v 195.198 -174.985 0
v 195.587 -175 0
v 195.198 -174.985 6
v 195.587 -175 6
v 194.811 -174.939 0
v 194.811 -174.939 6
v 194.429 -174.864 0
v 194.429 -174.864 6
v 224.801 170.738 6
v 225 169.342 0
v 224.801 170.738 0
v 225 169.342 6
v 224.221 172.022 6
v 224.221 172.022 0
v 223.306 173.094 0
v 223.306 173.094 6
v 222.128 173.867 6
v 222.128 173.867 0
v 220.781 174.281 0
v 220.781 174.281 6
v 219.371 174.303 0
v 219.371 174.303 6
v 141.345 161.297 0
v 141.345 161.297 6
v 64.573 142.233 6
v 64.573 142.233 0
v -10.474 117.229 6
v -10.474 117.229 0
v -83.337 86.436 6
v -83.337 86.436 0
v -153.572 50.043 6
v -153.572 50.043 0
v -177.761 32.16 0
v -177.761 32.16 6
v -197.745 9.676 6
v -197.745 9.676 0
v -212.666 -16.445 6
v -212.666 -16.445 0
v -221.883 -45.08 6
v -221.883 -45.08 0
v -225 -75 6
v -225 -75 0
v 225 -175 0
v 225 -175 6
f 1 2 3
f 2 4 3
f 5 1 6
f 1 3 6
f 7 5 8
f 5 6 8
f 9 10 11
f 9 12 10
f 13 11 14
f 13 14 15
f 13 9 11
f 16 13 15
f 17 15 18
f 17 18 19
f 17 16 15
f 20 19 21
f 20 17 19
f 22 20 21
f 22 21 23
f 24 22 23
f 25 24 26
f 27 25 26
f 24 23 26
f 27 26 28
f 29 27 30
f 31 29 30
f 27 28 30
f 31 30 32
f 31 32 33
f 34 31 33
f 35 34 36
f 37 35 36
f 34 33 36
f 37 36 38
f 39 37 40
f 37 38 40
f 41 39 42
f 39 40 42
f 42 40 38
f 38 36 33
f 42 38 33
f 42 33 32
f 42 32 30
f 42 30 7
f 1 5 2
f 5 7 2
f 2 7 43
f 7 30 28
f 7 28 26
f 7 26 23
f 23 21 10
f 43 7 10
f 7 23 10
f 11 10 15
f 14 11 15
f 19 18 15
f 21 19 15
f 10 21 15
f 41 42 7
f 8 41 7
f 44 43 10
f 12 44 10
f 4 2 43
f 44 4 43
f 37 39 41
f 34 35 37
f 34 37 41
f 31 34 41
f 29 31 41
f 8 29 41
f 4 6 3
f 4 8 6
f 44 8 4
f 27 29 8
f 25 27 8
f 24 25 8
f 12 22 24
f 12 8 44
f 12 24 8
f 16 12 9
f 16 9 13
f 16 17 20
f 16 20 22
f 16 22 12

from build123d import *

# Parameters (mm, degrees)
F1_DEPTH = 6
F2_R     = 5


with BuildPart() as f1:
    # F0 (on Top) → F1 (new body)
    with BuildSketch(Plane.XY):
        with BuildLine():
            Line((195, -175), (225, -175))
            Line((225, -175), (225, 175))
            ThreePointArc((225, 175), (29.4969127553, 131.3574891295), (-153.5716205835, 50.0430501997))
            ThreePointArc((-153.5716205835, 50.0430501997), (-205.8843017039, -2.9969136264), (-225, -75))
            Line((-225, -75), (195, -175))
        make_face()
    extrude(amount=F1_DEPTH)

    # F2
    f2_edges = [f1.edges().sort_by_distance(p)[0] for p in [
        (225, 175, 3),
        (195, -175, 3),
    ]]
    fillet(f2_edges, radius=F2_R)


solid = f1.part
